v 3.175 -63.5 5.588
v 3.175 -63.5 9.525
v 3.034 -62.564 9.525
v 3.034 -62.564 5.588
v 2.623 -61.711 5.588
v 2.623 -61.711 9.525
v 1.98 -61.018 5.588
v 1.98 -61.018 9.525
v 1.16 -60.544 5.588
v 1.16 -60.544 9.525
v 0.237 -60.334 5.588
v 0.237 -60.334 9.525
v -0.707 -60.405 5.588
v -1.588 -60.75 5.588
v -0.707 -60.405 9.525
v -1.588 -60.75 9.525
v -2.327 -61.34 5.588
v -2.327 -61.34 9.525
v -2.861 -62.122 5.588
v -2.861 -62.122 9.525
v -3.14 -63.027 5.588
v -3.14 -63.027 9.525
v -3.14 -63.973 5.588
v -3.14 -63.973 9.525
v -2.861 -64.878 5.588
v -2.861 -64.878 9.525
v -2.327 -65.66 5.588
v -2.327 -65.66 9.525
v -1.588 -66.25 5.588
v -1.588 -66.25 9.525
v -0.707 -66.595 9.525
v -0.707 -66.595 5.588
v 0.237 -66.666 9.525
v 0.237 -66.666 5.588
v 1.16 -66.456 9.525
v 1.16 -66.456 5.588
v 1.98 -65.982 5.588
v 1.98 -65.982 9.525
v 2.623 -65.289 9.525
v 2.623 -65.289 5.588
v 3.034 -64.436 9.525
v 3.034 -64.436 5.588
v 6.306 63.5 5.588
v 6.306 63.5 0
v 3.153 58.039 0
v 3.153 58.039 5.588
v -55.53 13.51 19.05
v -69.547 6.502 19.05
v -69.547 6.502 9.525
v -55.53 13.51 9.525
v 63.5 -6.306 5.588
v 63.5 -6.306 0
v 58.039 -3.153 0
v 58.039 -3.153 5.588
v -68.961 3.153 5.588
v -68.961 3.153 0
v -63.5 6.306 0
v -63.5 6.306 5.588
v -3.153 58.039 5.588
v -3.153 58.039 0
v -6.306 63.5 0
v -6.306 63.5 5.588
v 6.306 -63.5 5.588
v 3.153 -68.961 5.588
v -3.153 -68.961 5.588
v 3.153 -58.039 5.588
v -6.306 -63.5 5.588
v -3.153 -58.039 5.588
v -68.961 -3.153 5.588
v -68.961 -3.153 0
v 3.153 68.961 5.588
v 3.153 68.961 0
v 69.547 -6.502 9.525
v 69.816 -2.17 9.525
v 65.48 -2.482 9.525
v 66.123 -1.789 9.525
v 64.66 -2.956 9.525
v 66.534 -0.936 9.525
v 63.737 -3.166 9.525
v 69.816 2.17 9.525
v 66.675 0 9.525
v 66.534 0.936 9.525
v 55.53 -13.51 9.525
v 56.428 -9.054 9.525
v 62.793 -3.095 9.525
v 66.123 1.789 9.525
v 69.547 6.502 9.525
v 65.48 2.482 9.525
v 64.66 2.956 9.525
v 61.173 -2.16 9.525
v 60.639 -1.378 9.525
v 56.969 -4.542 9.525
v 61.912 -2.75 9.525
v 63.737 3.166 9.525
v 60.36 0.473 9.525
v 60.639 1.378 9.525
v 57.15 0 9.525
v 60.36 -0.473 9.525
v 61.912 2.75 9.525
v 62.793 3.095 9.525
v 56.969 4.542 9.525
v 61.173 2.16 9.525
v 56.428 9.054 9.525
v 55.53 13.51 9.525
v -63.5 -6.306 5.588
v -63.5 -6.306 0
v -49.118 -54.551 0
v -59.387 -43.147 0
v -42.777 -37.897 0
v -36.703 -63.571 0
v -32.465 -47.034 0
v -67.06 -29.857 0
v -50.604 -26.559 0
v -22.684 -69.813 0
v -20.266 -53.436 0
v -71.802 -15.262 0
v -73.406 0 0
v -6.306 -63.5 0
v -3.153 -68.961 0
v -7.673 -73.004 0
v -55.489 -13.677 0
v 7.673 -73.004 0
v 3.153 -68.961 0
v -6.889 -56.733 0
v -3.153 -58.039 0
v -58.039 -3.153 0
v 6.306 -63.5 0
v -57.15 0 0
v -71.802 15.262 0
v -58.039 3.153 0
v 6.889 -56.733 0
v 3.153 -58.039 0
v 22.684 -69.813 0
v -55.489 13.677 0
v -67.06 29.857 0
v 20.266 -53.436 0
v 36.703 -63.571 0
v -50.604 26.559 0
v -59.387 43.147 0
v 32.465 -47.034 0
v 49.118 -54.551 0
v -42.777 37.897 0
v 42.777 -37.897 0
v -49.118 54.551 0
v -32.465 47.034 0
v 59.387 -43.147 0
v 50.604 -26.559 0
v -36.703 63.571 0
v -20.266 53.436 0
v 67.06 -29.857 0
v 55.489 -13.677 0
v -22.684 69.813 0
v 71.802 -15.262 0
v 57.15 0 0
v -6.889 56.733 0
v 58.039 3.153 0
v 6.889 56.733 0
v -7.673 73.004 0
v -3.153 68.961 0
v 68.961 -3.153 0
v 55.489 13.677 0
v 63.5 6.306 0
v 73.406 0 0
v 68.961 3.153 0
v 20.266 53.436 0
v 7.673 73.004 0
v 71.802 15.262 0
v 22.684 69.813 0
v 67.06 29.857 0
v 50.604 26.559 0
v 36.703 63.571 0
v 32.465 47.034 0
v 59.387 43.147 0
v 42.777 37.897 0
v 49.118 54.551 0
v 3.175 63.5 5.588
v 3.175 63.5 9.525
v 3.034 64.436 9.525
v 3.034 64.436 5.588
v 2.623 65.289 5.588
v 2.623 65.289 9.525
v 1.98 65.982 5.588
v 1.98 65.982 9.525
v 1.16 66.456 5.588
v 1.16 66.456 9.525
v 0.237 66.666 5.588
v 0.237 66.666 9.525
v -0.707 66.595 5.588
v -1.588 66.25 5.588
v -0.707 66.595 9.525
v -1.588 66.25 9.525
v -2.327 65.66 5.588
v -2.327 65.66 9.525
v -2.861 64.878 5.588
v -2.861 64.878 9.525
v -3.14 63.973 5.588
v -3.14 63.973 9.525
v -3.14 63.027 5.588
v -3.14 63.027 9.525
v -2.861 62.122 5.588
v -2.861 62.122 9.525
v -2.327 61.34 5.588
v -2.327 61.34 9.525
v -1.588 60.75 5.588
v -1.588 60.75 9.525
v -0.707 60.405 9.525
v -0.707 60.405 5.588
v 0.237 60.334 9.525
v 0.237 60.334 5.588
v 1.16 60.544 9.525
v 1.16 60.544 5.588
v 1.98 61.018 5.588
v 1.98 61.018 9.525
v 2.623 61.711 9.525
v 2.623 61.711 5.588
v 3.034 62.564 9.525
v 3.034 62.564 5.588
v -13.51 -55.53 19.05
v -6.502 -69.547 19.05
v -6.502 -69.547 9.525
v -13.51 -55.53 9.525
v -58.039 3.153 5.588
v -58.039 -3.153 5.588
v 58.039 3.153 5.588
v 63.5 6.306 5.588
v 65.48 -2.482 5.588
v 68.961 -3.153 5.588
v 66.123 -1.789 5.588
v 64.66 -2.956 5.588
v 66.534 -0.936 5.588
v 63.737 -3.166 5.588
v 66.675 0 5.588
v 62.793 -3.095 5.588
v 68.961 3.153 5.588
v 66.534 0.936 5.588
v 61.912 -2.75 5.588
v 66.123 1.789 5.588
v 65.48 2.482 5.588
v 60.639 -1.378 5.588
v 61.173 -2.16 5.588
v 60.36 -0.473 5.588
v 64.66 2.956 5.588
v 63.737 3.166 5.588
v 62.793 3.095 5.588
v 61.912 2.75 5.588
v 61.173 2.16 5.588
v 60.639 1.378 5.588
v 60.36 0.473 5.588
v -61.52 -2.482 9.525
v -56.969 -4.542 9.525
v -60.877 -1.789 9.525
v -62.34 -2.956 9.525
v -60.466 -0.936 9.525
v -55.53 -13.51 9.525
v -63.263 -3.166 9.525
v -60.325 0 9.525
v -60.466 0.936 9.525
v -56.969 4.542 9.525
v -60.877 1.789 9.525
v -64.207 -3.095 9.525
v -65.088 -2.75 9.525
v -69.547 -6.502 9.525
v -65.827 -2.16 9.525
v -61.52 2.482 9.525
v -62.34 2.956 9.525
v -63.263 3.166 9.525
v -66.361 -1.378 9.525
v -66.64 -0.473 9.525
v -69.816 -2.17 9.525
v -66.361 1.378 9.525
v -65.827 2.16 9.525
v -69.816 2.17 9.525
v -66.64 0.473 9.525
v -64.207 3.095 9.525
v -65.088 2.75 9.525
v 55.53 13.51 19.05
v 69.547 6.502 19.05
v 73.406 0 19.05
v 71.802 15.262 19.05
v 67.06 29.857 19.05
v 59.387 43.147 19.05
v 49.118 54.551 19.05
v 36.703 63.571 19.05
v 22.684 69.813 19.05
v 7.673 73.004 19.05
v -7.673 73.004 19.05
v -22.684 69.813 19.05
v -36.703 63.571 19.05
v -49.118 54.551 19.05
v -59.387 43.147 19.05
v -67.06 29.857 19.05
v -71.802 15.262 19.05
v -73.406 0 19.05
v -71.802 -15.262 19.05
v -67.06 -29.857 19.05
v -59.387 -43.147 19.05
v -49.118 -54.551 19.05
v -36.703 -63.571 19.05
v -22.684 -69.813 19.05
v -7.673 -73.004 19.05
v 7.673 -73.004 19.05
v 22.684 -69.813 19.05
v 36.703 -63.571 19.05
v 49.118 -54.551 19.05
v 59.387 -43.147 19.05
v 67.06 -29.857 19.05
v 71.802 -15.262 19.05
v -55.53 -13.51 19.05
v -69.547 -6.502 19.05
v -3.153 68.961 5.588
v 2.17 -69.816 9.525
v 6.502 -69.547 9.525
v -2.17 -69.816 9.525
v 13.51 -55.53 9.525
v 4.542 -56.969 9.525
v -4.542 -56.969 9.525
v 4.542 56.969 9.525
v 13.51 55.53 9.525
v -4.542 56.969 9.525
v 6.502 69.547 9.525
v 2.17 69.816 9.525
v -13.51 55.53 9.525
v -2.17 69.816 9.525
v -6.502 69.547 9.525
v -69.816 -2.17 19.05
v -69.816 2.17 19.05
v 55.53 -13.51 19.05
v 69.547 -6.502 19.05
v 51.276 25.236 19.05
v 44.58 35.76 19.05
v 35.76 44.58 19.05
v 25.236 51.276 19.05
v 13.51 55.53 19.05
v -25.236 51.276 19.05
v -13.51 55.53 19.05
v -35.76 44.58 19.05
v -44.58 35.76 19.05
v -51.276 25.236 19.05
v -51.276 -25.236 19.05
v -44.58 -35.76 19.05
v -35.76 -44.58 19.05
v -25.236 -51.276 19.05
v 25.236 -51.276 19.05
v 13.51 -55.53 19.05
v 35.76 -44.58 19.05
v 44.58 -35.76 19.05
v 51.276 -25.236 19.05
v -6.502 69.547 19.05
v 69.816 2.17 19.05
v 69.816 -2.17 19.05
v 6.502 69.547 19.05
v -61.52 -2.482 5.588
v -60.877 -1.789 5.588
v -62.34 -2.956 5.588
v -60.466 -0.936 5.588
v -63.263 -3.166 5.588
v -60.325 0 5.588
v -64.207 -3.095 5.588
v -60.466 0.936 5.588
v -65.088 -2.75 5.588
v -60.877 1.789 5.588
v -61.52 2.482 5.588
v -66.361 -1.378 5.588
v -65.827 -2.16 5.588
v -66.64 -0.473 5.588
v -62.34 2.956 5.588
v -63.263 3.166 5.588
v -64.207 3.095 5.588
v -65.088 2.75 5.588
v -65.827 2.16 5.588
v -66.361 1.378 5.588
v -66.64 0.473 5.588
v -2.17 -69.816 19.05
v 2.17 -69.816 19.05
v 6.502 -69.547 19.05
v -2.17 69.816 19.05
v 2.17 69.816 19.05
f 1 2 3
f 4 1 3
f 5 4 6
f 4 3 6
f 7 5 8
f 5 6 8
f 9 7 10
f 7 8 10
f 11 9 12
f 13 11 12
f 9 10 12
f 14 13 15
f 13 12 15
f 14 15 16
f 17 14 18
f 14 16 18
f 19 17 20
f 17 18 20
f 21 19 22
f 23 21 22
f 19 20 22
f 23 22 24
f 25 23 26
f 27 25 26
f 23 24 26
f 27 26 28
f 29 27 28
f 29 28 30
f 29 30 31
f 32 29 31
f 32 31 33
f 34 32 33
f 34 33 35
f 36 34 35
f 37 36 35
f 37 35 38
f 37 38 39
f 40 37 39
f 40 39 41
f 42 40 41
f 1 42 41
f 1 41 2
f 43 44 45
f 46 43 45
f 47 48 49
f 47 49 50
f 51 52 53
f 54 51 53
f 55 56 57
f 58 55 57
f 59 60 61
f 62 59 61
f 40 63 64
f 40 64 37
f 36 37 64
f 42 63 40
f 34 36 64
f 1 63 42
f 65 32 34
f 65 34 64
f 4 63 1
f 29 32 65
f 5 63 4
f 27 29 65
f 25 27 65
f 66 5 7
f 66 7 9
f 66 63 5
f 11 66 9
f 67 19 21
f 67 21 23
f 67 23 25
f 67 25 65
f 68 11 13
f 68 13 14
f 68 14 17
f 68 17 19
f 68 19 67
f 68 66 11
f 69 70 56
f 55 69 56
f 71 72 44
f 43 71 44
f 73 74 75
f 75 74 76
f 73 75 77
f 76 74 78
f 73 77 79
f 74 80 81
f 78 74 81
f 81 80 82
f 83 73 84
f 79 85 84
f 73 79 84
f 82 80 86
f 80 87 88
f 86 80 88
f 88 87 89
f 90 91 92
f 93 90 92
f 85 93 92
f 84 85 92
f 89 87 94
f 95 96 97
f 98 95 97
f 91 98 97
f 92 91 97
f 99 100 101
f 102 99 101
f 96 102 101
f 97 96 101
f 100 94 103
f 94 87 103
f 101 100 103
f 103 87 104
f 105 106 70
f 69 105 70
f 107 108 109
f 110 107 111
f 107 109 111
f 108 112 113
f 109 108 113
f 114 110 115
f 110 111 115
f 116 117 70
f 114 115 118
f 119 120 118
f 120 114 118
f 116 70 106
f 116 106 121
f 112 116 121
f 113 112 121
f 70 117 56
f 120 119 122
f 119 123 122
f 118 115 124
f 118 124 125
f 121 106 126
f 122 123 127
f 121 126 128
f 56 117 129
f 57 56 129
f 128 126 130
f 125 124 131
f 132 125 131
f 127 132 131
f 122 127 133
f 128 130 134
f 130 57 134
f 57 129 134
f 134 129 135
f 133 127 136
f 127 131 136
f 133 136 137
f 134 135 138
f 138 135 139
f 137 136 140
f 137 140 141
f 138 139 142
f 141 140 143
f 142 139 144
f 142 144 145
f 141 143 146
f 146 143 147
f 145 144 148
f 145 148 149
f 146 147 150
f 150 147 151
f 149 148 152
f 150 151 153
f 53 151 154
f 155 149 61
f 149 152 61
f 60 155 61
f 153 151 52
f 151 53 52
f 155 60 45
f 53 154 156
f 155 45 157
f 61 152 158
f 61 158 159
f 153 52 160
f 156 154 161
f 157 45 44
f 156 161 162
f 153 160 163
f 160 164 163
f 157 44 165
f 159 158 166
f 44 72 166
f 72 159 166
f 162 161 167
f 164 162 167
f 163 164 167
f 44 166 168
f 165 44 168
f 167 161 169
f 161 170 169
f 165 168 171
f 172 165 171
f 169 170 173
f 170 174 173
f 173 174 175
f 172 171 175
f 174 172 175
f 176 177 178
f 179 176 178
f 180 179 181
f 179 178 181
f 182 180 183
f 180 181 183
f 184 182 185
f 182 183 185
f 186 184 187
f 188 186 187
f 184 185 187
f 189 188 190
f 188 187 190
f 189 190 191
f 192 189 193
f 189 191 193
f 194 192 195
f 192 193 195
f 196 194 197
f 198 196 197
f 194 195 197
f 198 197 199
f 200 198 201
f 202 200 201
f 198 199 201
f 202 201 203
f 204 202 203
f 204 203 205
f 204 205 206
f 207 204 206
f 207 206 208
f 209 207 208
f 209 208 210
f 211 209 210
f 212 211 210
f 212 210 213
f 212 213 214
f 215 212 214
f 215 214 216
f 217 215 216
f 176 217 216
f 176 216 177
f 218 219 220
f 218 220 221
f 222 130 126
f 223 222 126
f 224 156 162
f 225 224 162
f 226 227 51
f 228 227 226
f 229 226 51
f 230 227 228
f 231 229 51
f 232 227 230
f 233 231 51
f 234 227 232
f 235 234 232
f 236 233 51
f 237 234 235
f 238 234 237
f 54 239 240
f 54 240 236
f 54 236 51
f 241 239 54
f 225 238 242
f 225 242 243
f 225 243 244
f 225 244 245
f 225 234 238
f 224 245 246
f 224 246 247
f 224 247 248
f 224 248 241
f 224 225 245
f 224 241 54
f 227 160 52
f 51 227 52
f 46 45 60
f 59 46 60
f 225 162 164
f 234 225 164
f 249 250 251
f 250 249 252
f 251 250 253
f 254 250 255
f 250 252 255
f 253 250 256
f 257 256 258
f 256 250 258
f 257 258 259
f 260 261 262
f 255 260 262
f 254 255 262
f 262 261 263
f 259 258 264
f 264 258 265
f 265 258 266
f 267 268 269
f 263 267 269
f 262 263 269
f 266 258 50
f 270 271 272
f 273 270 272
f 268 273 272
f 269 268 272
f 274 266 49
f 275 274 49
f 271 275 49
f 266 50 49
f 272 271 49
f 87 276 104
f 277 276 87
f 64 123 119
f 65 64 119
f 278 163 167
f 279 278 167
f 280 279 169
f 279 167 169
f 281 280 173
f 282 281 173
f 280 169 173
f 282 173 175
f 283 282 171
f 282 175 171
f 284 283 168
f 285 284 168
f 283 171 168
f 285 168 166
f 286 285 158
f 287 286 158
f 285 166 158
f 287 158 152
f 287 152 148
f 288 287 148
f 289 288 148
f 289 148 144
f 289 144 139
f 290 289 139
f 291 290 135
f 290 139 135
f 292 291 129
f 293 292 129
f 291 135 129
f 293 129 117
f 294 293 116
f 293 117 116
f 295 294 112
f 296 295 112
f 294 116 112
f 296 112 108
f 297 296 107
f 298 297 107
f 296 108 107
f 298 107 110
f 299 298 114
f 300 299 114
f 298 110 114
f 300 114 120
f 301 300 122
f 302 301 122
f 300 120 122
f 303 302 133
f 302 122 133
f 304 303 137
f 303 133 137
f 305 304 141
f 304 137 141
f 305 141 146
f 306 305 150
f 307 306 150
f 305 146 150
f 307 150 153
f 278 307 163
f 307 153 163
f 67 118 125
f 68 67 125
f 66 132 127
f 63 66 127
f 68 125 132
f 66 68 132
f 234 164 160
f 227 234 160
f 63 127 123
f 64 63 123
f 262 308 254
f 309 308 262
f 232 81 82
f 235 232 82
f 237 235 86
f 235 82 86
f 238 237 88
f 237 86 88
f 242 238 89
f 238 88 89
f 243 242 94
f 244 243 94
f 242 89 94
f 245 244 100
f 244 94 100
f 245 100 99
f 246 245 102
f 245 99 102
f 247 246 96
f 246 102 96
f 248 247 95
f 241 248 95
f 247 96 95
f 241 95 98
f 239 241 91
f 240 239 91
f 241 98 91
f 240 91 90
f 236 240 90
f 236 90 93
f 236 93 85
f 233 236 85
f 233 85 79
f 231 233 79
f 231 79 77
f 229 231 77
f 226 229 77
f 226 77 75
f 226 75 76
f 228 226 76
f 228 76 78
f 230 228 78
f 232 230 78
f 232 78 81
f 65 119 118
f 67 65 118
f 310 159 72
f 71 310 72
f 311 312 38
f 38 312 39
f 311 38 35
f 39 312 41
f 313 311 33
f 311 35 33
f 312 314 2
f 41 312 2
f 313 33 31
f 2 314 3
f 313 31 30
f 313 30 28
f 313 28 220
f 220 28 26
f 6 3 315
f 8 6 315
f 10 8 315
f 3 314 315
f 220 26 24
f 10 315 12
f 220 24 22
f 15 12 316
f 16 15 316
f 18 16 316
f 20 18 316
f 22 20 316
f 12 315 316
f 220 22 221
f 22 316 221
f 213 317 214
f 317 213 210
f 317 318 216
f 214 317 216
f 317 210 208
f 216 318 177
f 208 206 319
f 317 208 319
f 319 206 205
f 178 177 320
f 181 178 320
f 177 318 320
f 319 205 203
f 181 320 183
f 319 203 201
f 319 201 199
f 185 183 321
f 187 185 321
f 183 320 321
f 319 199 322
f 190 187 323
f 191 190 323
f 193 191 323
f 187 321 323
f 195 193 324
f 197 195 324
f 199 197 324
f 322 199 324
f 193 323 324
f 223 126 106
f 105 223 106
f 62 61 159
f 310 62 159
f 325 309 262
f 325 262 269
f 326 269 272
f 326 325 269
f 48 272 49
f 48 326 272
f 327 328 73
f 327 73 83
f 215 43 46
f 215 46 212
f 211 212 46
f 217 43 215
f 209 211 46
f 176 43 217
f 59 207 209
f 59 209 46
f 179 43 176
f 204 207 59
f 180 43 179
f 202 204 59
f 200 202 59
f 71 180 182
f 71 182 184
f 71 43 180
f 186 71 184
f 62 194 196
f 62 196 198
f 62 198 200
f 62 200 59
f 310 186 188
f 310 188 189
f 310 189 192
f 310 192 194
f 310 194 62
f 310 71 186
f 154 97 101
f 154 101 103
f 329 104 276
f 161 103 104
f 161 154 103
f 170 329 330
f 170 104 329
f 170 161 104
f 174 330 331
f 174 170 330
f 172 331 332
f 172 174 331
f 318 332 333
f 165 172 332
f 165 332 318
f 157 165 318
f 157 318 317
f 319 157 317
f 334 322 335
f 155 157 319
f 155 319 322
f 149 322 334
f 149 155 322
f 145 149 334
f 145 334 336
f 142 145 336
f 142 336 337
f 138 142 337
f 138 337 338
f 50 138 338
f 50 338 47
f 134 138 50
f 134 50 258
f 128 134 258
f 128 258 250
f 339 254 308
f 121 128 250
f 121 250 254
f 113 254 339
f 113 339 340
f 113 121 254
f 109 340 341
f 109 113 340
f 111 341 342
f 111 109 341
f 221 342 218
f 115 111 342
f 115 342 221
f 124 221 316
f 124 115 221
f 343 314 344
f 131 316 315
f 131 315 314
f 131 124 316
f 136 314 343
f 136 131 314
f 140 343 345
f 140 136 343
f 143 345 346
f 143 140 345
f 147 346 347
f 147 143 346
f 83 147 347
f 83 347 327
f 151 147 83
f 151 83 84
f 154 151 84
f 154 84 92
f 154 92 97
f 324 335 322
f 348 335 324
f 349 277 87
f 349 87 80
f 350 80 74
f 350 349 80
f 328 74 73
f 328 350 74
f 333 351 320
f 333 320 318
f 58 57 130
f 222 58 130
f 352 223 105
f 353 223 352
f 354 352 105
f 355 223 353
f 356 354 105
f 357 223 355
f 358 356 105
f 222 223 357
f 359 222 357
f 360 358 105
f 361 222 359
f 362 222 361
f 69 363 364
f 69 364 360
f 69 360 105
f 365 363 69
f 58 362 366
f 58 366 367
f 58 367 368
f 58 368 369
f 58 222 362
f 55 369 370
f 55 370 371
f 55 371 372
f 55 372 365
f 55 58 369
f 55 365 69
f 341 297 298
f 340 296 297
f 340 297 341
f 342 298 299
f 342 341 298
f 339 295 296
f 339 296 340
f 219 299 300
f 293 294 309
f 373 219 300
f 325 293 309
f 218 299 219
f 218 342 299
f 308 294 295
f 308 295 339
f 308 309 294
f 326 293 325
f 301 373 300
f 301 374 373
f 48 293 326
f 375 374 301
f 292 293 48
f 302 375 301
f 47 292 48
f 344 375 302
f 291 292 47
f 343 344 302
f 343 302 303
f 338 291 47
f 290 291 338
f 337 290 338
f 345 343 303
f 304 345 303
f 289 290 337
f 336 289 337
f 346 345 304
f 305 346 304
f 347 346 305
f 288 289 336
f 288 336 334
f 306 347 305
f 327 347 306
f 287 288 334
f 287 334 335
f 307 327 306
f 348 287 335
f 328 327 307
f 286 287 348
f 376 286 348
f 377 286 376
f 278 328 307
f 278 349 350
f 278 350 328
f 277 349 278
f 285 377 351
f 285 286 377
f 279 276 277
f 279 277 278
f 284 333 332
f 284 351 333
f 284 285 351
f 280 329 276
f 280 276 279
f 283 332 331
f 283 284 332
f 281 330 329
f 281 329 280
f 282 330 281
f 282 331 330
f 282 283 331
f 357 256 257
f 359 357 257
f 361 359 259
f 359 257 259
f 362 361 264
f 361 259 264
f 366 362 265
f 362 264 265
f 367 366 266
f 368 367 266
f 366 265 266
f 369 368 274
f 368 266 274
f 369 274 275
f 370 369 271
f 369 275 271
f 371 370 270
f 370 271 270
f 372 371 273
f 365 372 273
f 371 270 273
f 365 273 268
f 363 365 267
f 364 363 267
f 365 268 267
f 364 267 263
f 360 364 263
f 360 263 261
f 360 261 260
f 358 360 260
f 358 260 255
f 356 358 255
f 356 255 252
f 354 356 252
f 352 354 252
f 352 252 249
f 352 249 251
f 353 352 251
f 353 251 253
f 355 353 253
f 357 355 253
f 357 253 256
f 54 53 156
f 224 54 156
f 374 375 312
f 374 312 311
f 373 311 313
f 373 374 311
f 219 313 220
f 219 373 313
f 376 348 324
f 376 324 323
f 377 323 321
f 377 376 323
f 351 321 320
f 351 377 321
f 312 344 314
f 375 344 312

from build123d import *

# Parameters (mm, degrees)
SKETCH2_R           = 73.406
SKETCH2_R_2         = 57.15
BOSS_EXTRUDE1_DEPTH = 19.05
CUT_EXTRUDE5_DEPTH  = 9.525
SKETCH9_R           = 3.175
CUT_EXTRUDE6_DEPTH  = 9.525
CUT_EXTRUDE7_DEPTH  = 5.588


with BuildPart() as part:
    # Sketch2 → Boss-Extrude1 (new body)
    with BuildSketch(Plane.XY):
        Circle(SKETCH2_R)
        Circle(SKETCH2_R_2, mode=Mode.SUBTRACT)
    extrude(amount=BOSS_EXTRUDE1_DEPTH)

    # Sketch7 → Cut-Extrude5 (cut)
    with BuildSketch(Plane.XY.offset(19.05)):
        with BuildLine():
            Line((-69.546757065, 6.501621467), (-55.530220399, 13.5098898))
            ThreePointArc((-55.530220399, 13.5098898), (-57.15, 0), (-55.530220399, -13.5098898))
            Line((-55.530220399, -13.5098898), (-69.546757065, -6.501621467))
            ThreePointArc((-69.546757065, -6.501621467), (-69.85, 0), (-69.546757065, 6.501621467))
        make_face()
        with BuildLine():
            Line((6.501621467, 69.546757065), (13.5098898, 55.530220399))
            ThreePointArc((13.5098898, 55.530220399), (0, 57.15), (-13.5098898, 55.530220399))
            Line((-13.5098898, 55.530220399), (-6.501621467, 69.546757065))
            ThreePointArc((-6.501621467, 69.546757065), (0, 69.85), (6.501621467, 69.546757065))
        make_face()
        with BuildLine():
            Line((69.546757065, -6.501621467), (55.530220399, -13.5098898))
            ThreePointArc((55.530220399, -13.5098898), (57.15, 0), (55.530220399, 13.5098898))
            Line((55.530220399, 13.5098898), (69.546757065, 6.501621467))
            ThreePointArc((69.546757065, 6.501621467), (69.85, 0), (69.546757065, -6.501621467))
        make_face()
        with BuildLine():
            Line((-6.501621467, -69.546757065), (-13.5098898, -55.530220399))
            ThreePointArc((-13.5098898, -55.530220399), (0, -57.15), (13.5098898, -55.530220399))
            Line((13.5098898, -55.530220399), (6.501621467, -69.546757065))
            ThreePointArc((6.501621467, -69.546757065), (0, -69.85), (-6.501621467, -69.546757065))
        make_face()
    extrude(amount=-CUT_EXTRUDE5_DEPTH, mode=Mode.SUBTRACT)

    # Sketch9 → Cut-Extrude6 (cut)
    with BuildSketch(Plane.XY.offset(9.525)):
        with Locations((-63.5, 0)):
            Circle(SKETCH9_R)
        with Locations((0, 63.5)):
            Circle(SKETCH9_R)
        with Locations((63.5, 0)):
            Circle(SKETCH9_R)
        with Locations((0, -63.5)):
            Circle(SKETCH9_R)
    extrude(amount=-CUT_EXTRUDE6_DEPTH, mode=Mode.SUBTRACT)

    # Sketch10 → Cut-Extrude7 (cut)
    with BuildSketch(Plane(origin=(0, 0, 0), x_dir=(-1, 0, 0), z_dir=(0, 0, -1))):
        Polygon((-6.30581964, 63.5), (-3.15290982, 58.039), (3.15290982, 58.039), (6.30581964, 63.5), (3.15290982, 68.961), (-3.15290982, 68.961), align=None)
        Polygon((-63.5, -6.30581964), (-58.039, -3.15290982), (-58.039, 3.15290982), (-63.5, 6.30581964), (-68.961, 3.15290982), (-68.961, -3.15290982), align=None)
        Polygon((63.5, 6.30581964), (58.039, 3.15290982), (58.039, -3.15290982), (63.5, -6.30581964), (68.961, -3.15290982), (68.961, 3.15290982), align=None)
        Polygon((6.30581964, -63.5), (3.15290982, -58.039), (-3.15290982, -58.039), (-6.30581964, -63.5), (-3.15290982, -68.961), (3.15290982, -68.961), align=None)
    extrude(amount=-CUT_EXTRUDE7_DEPTH, mode=Mode.SUBTRACT)


solid = part.part
